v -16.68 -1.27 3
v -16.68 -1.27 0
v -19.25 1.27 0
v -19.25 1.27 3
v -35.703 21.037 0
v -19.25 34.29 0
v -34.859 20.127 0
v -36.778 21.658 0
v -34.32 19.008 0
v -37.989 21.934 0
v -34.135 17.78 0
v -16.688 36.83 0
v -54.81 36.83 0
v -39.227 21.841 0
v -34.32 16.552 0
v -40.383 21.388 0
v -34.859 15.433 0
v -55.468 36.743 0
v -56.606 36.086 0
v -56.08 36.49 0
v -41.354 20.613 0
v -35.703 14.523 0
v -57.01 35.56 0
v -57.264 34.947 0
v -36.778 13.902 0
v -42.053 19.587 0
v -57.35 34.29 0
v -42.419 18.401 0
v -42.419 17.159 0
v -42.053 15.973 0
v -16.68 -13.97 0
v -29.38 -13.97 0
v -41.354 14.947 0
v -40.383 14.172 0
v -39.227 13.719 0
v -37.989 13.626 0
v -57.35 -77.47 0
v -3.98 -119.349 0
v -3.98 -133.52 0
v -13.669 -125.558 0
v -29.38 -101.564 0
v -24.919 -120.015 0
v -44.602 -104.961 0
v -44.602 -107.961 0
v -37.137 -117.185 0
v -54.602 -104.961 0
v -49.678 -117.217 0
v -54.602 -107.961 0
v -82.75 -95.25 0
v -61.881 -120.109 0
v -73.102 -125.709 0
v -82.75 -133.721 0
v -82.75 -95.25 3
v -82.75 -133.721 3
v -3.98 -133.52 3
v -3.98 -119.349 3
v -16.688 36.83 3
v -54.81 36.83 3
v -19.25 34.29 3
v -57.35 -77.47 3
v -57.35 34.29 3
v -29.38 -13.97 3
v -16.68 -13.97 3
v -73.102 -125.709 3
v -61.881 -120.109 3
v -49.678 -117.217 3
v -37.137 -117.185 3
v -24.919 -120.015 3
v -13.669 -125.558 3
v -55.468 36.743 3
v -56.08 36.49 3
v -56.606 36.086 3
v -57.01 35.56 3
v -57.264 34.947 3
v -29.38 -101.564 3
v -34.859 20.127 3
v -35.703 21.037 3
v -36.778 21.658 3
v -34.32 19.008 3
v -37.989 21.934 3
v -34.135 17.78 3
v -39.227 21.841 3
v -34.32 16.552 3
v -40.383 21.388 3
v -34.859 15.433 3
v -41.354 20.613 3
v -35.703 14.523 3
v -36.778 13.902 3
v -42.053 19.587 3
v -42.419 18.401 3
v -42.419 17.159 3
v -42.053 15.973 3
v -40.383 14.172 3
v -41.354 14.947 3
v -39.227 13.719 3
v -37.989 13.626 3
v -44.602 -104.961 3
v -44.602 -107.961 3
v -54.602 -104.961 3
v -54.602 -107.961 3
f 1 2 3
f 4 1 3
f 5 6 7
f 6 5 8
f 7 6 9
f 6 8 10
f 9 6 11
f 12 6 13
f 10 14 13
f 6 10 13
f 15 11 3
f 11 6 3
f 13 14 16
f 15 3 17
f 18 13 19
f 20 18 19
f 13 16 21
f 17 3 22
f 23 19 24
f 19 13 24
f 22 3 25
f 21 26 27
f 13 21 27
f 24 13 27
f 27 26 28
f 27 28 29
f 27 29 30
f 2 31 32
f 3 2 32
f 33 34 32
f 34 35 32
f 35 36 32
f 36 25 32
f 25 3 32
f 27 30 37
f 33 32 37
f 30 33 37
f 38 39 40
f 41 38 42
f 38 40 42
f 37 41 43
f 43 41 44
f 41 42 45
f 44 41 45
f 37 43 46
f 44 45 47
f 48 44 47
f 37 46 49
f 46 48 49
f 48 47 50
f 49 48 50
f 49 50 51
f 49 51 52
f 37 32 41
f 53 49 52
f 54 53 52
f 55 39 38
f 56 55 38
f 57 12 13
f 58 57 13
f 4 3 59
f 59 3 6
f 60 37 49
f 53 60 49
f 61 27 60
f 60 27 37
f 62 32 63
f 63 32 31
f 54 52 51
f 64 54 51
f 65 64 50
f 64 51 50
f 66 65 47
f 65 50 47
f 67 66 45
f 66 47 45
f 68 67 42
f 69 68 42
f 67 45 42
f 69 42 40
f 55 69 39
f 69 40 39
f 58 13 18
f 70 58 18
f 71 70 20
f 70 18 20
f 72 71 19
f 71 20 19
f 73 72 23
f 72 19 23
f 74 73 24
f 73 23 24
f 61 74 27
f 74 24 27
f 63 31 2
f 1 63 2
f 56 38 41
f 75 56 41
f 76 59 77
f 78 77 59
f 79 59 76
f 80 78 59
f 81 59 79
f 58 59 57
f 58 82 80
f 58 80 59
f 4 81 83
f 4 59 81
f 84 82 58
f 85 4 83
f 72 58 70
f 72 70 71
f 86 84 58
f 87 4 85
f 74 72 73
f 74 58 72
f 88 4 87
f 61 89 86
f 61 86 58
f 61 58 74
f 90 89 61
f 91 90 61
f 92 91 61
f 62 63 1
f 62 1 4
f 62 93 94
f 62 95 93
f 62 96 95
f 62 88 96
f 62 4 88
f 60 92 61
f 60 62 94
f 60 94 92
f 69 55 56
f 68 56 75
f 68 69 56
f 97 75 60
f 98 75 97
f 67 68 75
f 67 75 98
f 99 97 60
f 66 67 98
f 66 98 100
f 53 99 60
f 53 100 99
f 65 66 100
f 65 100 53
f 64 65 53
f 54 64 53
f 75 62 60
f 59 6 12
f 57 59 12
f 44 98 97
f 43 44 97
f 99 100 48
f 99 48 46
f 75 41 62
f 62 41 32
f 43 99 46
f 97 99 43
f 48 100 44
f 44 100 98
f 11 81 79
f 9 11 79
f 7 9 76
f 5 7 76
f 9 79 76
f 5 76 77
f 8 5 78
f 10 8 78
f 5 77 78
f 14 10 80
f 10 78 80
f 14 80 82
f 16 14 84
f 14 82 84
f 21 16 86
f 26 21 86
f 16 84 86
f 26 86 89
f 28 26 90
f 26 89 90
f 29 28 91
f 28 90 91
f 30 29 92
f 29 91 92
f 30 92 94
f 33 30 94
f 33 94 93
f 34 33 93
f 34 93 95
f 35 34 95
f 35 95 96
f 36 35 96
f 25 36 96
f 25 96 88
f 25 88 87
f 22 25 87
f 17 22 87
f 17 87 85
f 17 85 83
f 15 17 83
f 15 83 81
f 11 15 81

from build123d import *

# Parameters (mm, degrees)
BOSS_EXTRUDE1_DEPTH = 3
SKETCH2_R           = 4.1656
CUT_EXTRUDE1_DEPTH  = 158.283042746
SKETCH3_W           = 10.000000066
SKETCH3_H           = 3
CUT_EXTRUDE2_DEPTH  = 158.283042746


with BuildPart() as part:
    # Sketch1 → Boss-Extrude1 (new body)
    with BuildSketch(Plane(origin=(0, 0, 0), x_dir=(-1, 0, 0), z_dir=(0, 0, 1))):
        with BuildLine():
            Line((16.6878, -36.83), (54.810334268, -36.83))
            ThreePointArc((54.810334268, -36.83), (56.606385492, -36.086051224), (57.350334268, -34.29))
            Line((57.350334268, -34.29), (57.350334268, 77.47))
            Line((57.350334268, 77.47), (82.750334268, 95.25))
            Line((82.750334268, 95.25), (82.750334268, 133.721119177))
            ThreePointArc((82.750334268, 133.721119177), (43.408002592, 116.840177161), (3.980183448, 133.520475199))
            Line((3.980183448, 133.520475199), (3.980183448, 119.349325812))
            Line((3.980183448, 119.349325812), (29.380183448, 101.564054342))
            Line((29.380183448, 101.564054342), (29.380183448, 90.17))
            Line((29.380183448, 90.17), (29.380183448, 13.97))
            Line((29.380183448, 13.97), (16.680183448, 13.97))
            Line((16.680183448, 13.97), (16.680183448, 1.27))
            Line((16.680183448, 1.27), (19.250334268, -1.27))
            Line((19.250334268, -1.27), (19.250334268, -34.29))
            Line((19.250334268, -34.29), (16.6878, -36.83))
        make_face()
    extrude(amount=BOSS_EXTRUDE1_DEPTH)

    # Sketch2 → Cut-Extrude1 (cut, through all)
    with BuildSketch(Plane.XY.offset(3)):
        with Locations((-38.300334268, 17.78)):
            Circle(SKETCH2_R)
    extrude(amount=-CUT_EXTRUDE1_DEPTH, mode=Mode.SUBTRACT)

    # Sketch3 → Cut-Extrude2 (cut, through all)
    with BuildSketch(Plane.XY.offset(3)):
        with Locations((-49.602137137, -106.461390659)):
            Rectangle(SKETCH3_W, SKETCH3_H)
    extrude(amount=-CUT_EXTRUDE2_DEPTH, mode=Mode.SUBTRACT)


solid = part.part
